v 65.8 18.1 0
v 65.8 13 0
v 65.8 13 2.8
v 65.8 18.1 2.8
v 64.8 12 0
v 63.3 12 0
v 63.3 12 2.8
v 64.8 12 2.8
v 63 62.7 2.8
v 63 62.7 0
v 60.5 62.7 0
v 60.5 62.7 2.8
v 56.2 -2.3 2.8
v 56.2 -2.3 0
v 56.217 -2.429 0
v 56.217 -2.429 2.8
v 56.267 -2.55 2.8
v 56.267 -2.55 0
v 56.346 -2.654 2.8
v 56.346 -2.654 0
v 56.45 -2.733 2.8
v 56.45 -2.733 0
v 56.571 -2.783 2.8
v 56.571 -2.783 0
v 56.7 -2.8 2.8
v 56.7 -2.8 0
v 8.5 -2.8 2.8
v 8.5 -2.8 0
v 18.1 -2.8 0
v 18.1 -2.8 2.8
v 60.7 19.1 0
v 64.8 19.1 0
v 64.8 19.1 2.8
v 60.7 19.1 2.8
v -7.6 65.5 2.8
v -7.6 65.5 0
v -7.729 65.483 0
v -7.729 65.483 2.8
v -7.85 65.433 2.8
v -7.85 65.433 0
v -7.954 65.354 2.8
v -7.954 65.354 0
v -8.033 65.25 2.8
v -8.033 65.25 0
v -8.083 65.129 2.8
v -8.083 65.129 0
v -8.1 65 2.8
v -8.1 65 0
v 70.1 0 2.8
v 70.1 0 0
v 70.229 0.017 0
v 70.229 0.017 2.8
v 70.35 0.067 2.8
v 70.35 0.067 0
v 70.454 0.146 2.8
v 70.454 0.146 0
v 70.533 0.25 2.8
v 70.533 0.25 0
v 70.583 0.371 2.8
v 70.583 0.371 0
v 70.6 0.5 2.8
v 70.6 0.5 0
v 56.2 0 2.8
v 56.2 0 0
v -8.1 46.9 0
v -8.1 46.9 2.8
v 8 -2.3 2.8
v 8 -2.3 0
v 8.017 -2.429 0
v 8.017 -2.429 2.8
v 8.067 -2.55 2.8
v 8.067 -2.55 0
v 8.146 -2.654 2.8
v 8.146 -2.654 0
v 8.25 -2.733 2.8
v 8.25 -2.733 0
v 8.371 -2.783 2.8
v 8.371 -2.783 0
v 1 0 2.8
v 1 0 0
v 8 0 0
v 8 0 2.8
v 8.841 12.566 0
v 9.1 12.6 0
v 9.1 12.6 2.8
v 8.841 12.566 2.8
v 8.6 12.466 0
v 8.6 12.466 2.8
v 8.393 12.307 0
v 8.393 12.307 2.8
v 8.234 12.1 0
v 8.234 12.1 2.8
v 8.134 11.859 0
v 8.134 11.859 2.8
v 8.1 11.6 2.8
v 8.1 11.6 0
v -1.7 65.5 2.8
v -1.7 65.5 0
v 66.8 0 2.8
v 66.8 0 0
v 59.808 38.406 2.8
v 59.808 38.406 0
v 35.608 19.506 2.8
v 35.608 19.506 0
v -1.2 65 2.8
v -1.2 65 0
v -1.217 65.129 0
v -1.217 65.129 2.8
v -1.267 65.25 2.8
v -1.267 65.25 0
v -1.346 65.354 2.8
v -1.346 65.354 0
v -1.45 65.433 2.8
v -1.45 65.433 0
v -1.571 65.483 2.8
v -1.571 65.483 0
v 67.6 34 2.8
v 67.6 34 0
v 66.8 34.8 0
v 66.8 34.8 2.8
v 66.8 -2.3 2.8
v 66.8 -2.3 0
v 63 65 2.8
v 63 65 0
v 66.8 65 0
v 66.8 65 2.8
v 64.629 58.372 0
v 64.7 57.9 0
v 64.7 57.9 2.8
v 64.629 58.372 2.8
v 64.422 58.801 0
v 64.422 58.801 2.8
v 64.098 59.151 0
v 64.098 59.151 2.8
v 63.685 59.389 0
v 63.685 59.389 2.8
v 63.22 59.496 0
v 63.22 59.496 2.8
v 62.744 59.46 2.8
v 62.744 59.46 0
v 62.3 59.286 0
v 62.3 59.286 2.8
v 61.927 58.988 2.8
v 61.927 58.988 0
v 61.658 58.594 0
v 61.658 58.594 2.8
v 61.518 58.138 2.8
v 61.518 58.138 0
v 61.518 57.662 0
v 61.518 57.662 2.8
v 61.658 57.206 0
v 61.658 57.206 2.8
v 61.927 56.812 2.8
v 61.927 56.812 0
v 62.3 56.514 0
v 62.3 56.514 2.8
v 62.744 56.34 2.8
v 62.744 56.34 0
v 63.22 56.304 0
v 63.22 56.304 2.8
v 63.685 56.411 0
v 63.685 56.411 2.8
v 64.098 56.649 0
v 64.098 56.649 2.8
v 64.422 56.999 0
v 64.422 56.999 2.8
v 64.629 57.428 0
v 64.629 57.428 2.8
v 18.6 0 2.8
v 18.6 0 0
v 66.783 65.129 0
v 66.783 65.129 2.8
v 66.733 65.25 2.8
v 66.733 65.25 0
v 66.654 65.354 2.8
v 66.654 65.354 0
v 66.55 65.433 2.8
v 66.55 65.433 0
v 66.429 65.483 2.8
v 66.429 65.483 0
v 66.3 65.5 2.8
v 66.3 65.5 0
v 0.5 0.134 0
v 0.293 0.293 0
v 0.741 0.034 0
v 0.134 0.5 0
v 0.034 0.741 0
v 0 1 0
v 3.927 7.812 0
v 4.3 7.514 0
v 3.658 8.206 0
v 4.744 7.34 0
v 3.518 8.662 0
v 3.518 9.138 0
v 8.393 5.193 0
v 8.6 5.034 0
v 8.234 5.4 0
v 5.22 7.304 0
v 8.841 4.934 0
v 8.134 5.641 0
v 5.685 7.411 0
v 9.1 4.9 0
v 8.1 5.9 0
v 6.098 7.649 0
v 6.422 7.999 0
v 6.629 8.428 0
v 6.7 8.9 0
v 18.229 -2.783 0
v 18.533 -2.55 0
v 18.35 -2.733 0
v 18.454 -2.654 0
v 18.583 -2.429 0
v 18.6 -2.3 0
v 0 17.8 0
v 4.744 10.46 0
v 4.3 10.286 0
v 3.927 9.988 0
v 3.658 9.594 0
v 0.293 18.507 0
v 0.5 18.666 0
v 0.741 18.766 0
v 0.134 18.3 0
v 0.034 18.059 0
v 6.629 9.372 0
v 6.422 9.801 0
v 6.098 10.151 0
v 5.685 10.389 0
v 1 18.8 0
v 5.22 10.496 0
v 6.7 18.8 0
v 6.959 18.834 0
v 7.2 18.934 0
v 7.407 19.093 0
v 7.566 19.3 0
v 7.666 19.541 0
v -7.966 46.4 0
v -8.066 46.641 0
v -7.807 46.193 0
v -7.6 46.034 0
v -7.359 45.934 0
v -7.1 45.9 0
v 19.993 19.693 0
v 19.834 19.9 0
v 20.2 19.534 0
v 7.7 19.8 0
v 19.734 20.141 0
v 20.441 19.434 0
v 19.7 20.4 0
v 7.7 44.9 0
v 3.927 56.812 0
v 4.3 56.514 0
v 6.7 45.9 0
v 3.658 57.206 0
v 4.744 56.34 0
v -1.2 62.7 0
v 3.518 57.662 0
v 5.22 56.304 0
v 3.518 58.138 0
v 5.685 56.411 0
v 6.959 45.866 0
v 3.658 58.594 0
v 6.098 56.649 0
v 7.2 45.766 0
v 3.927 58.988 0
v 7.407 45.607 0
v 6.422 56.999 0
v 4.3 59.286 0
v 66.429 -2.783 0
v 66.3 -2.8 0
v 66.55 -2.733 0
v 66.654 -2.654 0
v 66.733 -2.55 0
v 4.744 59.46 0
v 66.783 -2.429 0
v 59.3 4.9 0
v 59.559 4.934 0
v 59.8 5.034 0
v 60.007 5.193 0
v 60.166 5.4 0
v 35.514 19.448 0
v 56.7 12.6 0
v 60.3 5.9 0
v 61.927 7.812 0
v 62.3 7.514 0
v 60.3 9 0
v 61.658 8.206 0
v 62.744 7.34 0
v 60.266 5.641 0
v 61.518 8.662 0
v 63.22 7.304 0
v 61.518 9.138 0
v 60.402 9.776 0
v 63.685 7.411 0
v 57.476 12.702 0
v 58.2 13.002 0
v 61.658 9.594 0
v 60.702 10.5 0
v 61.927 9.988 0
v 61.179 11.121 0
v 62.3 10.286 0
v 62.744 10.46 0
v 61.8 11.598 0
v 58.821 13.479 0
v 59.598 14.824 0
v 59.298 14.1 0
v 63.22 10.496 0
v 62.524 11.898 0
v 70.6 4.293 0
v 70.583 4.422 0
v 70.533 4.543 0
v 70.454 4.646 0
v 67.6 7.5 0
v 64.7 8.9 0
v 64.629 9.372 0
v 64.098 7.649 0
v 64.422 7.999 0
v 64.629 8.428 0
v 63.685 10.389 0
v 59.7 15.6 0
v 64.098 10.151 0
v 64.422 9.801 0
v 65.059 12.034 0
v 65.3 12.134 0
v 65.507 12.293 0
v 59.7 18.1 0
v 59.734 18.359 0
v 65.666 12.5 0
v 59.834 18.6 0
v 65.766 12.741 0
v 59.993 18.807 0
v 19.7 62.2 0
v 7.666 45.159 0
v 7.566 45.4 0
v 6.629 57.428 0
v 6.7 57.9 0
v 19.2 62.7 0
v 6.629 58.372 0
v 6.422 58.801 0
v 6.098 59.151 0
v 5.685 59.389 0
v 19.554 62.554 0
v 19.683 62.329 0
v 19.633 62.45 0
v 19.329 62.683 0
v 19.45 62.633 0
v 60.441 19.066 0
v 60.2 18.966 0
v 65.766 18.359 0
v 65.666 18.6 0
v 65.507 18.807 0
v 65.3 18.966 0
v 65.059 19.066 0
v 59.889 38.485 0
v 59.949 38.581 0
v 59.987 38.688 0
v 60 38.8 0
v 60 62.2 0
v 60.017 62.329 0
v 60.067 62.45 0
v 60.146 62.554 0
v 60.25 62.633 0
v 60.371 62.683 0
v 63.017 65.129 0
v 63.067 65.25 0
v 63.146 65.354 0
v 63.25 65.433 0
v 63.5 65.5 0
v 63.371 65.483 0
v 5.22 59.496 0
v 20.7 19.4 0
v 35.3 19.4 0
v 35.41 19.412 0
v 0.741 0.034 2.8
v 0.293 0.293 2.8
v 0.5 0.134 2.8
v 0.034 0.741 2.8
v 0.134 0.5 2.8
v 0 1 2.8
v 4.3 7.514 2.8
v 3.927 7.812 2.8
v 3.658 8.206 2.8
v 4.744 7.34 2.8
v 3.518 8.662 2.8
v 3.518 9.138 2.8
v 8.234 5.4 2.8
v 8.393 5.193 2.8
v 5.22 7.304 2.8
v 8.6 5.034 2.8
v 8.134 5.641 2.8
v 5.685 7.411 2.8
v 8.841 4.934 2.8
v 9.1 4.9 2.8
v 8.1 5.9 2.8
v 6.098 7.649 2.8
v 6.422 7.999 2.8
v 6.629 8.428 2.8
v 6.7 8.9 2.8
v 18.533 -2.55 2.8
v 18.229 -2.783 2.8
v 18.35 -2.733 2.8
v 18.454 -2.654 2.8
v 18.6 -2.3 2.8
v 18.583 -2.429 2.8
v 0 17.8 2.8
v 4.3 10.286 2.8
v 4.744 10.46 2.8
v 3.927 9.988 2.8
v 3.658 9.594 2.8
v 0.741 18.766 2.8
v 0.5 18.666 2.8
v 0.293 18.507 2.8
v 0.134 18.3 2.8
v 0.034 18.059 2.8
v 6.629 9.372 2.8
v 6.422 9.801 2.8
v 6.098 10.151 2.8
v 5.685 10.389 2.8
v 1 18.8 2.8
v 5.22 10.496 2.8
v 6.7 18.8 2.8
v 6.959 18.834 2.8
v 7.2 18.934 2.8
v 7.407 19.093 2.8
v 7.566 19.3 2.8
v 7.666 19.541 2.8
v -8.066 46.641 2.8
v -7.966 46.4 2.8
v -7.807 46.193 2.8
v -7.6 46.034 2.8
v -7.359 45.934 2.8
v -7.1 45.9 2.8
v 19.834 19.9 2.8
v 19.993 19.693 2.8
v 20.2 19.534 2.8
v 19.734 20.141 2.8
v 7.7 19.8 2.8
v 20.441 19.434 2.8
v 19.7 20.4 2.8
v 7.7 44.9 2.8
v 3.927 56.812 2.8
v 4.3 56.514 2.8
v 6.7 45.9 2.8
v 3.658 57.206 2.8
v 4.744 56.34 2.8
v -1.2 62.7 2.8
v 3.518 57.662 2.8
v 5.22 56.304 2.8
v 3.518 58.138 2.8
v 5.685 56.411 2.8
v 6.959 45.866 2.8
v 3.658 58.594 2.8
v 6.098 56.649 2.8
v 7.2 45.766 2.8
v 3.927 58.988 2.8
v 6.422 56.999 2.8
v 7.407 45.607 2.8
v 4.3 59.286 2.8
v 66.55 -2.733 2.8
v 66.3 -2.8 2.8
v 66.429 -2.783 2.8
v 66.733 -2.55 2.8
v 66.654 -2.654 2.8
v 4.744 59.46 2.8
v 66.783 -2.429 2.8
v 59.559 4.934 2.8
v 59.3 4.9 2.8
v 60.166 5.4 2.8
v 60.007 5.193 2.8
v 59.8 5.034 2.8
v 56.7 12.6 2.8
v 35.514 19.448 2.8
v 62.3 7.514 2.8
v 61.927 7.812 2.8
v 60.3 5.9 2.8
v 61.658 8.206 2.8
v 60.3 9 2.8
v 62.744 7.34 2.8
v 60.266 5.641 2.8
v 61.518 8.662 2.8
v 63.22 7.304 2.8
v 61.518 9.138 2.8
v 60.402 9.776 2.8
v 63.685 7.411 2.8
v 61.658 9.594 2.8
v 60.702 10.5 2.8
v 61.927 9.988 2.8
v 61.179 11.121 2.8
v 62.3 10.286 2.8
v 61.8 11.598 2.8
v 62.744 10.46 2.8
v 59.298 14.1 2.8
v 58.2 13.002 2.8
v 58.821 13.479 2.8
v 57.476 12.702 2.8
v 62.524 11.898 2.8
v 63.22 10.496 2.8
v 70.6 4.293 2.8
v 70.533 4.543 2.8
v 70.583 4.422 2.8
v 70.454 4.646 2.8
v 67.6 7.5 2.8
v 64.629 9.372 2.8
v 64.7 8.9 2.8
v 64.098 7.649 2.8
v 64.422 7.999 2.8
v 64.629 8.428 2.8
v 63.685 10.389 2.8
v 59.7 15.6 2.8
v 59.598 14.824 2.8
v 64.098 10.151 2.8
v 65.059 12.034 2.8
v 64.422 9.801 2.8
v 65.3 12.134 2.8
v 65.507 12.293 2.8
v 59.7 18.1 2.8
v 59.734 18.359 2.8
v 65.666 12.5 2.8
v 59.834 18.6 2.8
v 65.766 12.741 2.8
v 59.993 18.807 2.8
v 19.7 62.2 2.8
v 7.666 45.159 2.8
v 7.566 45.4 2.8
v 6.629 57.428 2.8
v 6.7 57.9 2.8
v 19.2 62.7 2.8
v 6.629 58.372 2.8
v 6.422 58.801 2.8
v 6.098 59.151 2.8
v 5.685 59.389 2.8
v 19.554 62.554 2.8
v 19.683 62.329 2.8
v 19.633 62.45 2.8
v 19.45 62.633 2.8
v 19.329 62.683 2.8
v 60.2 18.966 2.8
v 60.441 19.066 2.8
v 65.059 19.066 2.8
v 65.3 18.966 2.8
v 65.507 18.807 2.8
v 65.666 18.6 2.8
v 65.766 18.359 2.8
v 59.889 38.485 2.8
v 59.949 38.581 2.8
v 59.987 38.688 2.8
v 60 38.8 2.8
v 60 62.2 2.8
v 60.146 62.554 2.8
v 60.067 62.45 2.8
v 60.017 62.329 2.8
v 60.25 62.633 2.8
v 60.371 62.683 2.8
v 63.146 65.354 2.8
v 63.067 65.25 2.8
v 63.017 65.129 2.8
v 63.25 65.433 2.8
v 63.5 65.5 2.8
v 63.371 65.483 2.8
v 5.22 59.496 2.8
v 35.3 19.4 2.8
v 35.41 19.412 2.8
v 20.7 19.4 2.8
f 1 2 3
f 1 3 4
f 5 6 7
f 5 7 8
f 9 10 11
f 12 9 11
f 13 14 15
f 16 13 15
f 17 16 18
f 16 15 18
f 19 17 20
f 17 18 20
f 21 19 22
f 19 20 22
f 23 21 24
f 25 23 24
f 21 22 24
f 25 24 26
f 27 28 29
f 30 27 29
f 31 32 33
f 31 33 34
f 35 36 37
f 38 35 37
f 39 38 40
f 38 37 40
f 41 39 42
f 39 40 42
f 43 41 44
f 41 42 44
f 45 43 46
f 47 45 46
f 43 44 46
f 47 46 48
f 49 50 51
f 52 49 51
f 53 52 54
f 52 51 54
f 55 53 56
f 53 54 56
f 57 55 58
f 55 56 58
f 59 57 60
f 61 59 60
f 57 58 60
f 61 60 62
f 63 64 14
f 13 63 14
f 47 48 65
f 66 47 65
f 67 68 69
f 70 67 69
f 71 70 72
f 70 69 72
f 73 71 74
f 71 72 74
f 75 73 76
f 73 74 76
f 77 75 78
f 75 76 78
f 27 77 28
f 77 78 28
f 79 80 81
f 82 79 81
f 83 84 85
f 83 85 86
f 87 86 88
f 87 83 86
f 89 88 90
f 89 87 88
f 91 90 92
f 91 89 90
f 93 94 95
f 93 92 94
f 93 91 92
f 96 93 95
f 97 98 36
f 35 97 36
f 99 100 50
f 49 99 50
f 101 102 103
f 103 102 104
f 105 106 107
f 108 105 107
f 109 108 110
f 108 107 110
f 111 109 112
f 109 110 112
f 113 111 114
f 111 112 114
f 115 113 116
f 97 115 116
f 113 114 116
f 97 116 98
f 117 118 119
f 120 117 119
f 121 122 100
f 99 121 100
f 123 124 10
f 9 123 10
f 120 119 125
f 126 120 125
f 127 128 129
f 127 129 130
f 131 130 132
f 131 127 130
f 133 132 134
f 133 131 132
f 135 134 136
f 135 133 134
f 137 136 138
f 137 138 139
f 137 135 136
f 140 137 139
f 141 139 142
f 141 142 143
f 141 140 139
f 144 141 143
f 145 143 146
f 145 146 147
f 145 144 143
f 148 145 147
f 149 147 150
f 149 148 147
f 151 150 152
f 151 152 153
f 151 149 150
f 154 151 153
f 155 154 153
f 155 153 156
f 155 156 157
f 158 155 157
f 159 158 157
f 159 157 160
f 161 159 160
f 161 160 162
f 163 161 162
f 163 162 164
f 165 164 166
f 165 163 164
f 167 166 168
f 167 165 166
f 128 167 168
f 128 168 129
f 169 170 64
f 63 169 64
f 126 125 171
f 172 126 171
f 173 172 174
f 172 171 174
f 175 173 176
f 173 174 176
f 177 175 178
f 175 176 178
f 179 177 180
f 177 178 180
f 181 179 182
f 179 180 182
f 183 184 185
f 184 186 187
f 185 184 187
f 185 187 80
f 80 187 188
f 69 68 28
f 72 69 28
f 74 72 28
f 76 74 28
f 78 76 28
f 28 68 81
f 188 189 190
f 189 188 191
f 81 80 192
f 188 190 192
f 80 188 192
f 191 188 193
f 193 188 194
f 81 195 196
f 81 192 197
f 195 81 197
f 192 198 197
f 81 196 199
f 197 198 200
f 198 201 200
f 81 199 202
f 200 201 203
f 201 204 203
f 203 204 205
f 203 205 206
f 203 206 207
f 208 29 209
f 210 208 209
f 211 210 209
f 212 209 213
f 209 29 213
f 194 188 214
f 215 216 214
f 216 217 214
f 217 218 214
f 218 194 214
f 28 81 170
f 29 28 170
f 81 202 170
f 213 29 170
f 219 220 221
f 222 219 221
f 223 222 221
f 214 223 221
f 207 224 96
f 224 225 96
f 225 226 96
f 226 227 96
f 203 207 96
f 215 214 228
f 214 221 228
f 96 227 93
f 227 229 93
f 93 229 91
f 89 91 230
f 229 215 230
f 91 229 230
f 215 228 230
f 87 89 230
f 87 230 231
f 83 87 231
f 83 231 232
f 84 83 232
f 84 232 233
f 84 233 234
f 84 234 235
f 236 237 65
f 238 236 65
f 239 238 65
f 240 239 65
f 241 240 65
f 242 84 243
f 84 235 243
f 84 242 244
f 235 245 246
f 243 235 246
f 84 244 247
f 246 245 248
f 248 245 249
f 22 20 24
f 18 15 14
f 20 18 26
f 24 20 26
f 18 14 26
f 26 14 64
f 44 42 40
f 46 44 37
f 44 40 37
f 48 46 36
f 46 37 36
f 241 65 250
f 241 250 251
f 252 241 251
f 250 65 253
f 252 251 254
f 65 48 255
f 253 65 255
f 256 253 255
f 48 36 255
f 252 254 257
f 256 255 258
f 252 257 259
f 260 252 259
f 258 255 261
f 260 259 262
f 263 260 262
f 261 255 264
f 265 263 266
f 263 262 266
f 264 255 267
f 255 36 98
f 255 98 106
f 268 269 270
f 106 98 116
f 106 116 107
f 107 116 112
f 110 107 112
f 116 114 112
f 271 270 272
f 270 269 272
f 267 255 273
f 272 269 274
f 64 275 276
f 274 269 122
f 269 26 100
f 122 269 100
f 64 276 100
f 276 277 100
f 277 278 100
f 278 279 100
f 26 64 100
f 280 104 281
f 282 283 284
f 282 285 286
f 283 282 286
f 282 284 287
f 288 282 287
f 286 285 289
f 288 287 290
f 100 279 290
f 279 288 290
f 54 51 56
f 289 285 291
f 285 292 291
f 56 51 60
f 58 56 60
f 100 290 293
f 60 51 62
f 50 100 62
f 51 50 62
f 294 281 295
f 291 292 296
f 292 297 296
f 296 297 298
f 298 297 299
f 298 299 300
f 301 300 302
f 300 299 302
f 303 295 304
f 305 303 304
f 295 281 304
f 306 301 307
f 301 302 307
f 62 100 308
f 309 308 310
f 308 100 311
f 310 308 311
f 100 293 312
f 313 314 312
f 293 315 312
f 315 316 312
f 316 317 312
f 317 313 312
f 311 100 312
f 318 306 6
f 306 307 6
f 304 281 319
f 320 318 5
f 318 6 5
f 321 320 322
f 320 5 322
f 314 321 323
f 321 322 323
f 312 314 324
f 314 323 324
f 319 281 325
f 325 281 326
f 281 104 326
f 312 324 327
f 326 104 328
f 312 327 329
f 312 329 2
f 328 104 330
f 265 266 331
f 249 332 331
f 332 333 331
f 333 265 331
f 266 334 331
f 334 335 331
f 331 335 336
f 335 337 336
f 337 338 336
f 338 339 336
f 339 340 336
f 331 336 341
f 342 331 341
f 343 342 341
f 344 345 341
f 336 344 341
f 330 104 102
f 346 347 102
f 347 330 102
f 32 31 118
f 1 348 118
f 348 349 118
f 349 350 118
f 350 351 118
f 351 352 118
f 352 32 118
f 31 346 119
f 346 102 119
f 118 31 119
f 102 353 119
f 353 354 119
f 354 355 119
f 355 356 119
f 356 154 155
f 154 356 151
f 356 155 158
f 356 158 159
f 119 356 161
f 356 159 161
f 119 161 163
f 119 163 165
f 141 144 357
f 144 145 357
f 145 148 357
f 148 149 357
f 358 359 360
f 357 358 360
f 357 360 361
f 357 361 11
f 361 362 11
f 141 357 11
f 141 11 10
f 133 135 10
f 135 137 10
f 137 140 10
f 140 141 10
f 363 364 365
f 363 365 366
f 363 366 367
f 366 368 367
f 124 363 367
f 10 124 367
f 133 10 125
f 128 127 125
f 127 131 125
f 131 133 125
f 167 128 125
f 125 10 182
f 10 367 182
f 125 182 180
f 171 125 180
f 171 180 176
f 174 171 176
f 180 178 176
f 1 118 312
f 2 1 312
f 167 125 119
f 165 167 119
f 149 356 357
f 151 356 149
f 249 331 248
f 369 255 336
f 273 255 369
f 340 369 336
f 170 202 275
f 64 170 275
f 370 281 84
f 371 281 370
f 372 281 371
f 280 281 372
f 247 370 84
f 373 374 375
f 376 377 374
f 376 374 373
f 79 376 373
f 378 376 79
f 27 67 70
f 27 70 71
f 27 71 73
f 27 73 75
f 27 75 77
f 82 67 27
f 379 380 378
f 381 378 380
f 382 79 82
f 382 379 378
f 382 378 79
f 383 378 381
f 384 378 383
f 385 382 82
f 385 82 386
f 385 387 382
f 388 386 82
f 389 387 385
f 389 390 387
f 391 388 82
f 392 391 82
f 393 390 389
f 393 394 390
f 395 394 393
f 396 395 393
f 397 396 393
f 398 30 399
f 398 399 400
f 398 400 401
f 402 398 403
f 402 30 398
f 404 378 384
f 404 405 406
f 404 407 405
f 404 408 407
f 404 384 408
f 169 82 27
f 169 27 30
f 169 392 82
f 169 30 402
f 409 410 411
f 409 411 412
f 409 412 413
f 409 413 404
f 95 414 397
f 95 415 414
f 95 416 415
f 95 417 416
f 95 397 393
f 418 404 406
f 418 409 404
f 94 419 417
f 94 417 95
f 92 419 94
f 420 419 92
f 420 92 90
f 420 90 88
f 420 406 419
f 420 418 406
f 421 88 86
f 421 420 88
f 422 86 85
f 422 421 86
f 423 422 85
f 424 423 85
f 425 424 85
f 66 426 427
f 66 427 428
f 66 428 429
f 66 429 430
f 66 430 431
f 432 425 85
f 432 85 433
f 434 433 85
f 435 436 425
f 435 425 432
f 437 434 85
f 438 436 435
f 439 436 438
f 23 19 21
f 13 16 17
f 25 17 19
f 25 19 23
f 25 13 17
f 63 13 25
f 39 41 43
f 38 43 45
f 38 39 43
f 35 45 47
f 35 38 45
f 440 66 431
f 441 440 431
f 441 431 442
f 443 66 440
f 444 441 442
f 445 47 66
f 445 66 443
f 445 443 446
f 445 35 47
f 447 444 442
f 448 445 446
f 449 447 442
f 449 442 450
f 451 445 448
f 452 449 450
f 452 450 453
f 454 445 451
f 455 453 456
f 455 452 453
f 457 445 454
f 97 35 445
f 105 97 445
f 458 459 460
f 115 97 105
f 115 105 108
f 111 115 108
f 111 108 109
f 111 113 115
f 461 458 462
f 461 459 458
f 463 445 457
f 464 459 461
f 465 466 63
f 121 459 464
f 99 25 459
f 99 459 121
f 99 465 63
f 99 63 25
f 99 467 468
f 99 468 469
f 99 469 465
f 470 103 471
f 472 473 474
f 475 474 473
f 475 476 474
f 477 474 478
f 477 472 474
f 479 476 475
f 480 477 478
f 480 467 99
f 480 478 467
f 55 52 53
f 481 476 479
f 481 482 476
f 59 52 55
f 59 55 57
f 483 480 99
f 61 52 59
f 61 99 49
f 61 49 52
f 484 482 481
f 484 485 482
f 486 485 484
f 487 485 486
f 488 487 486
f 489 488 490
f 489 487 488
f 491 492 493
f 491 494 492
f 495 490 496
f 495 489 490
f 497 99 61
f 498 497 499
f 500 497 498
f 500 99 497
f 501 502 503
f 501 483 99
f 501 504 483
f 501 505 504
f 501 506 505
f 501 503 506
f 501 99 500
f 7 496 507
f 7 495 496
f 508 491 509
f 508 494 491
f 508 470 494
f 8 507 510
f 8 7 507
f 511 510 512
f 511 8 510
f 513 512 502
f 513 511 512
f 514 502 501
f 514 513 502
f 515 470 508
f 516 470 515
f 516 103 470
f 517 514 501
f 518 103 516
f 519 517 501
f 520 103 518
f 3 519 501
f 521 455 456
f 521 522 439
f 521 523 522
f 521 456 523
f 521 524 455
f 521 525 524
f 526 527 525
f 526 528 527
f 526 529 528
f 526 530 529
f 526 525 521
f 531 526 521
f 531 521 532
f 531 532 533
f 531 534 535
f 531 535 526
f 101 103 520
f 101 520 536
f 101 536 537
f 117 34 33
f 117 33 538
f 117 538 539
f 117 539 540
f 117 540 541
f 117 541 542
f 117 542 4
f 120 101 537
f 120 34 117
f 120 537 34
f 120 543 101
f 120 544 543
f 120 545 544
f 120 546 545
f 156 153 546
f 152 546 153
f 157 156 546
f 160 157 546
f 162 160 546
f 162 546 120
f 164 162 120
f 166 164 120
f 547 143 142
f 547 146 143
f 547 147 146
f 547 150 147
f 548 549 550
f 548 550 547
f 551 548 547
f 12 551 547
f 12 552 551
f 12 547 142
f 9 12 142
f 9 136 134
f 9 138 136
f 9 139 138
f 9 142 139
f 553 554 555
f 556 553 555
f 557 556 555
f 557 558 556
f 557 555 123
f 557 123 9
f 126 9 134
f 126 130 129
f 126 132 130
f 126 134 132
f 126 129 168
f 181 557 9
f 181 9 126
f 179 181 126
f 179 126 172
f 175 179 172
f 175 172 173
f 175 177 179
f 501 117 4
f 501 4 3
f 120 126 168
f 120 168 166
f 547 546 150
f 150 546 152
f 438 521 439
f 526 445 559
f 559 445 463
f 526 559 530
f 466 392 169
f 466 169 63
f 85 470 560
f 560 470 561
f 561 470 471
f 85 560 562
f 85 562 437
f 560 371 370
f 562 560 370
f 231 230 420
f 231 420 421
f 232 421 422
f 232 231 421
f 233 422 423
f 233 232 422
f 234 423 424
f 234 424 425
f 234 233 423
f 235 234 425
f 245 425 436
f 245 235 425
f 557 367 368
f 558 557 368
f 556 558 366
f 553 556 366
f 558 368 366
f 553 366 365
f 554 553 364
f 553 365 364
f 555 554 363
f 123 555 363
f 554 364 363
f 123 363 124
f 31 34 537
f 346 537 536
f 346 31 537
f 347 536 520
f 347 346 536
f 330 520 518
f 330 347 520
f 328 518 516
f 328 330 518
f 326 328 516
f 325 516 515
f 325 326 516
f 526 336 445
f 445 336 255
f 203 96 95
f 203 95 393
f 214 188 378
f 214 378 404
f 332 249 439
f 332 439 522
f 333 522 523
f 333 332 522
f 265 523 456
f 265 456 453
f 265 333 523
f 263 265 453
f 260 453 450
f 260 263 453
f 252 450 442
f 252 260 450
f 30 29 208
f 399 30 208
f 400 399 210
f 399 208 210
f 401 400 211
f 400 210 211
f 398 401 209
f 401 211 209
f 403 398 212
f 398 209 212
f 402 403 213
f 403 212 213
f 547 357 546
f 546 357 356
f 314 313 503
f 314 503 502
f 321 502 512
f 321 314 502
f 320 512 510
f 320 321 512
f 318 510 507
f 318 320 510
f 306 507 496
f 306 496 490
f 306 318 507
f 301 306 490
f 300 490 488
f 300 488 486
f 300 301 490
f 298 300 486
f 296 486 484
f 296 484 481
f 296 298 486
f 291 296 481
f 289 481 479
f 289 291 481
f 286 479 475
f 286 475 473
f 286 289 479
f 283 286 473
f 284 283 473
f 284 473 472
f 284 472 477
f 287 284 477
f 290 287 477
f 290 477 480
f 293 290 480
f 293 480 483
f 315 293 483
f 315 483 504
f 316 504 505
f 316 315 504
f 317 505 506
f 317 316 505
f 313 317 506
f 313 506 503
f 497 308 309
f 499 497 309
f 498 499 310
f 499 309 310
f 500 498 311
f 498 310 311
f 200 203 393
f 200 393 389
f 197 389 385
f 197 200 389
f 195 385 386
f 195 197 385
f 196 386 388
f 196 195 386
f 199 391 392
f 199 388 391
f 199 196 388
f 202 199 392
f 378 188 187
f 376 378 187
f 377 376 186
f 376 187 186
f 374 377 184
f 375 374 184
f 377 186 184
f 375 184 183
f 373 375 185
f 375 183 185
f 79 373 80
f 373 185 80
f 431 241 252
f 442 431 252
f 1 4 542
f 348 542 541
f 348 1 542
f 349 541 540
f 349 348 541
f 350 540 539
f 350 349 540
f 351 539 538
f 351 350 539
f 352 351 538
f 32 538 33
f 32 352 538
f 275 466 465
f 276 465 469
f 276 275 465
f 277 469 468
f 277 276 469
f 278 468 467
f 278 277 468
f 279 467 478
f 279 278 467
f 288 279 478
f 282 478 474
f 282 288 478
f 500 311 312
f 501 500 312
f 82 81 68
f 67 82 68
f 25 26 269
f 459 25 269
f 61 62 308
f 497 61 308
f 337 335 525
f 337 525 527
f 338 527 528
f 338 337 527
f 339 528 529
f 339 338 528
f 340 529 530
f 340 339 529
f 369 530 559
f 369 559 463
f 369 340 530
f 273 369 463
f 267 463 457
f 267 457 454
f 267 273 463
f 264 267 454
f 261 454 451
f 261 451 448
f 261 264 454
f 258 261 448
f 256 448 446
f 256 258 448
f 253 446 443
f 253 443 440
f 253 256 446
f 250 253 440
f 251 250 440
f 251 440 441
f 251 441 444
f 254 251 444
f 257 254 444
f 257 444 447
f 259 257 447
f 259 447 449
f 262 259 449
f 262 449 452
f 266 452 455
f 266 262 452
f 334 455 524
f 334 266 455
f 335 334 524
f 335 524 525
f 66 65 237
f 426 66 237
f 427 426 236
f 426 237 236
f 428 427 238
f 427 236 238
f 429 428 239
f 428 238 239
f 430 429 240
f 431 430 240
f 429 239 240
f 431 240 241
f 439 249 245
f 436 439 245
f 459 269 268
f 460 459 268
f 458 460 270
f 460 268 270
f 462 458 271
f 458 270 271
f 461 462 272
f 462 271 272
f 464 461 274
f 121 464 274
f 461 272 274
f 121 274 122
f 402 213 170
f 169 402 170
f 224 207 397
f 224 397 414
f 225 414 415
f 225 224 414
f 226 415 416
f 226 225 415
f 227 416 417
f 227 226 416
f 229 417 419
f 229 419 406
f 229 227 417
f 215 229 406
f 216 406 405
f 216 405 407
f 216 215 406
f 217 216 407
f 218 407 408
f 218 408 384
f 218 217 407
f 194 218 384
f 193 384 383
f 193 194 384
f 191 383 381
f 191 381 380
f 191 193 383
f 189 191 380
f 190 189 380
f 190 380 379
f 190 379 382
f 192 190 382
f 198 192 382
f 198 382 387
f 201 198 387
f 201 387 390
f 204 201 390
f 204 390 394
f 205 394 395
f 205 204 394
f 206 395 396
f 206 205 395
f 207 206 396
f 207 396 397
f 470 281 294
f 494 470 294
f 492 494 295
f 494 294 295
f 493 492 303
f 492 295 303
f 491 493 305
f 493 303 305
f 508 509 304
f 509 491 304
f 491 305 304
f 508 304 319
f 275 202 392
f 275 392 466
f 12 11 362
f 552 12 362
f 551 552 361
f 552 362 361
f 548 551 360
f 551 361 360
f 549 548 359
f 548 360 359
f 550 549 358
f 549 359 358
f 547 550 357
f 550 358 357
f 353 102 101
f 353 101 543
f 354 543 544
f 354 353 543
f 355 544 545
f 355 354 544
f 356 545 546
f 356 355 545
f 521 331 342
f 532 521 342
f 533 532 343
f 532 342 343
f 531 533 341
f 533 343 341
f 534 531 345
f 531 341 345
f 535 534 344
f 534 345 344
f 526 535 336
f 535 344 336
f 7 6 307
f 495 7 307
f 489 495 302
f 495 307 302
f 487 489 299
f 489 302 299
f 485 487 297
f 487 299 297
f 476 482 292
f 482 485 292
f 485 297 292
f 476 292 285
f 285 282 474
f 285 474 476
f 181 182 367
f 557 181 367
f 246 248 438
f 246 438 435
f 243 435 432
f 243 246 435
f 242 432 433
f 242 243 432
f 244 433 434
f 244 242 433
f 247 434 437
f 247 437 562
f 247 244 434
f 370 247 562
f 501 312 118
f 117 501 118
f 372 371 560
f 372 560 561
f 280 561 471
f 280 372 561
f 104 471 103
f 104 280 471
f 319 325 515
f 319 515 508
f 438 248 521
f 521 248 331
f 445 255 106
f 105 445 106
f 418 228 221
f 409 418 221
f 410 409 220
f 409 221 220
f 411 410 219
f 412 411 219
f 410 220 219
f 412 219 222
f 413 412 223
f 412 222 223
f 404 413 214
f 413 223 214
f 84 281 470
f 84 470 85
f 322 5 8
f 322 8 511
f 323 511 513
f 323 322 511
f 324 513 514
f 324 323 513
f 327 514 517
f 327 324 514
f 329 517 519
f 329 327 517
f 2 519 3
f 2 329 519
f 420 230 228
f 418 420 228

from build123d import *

# Parameters (mm, degrees)
SKETCH_R     = 1.6
PAD_DEPTH    = 2.8
POCKET_DEPTH = 2.801


with BuildPart() as part:
    # Sketch → Pad (new body)
    with BuildSketch(Plane.XY):
        with BuildLine():
            Line((1, 0), (8, 0))
            Line((8, 0), (8, -2.3))
            ThreePointArc((8, -2.3), (8.146447, -2.653553), (8.5, -2.8))
            Line((8.5, -2.8), (18.1, -2.8))
            ThreePointArc((18.1, -2.8), (18.453553, -2.653553), (18.6, -2.3))
            Line((18.6, -2.3), (18.6, 0))
            Line((18.6, 0), (56.2, 0))
            Line((56.2, 0), (56.2, -2.3))
            ThreePointArc((56.2, -2.3), (56.346447, -2.653553), (56.7, -2.8))
            Line((56.7, -2.8), (66.3, -2.8))
            ThreePointArc((66.3, -2.8), (66.653553, -2.653553), (66.8, -2.3))
            Line((66.8, -2.3), (66.8, 0))
            Line((66.8, 0), (70.1, 0))
            ThreePointArc((70.1, 0), (70.453553, 0.146447), (70.6, 0.5))
            Line((70.6, 0.5), (70.6, 4.292893))
            ThreePointArc((70.6, 4.292893), (70.56194, 4.484235), (70.453553, 4.646447))
            Line((70.453553, 4.646447), (67.6, 7.5))
            Line((67.6, 7.5), (67.6, 34))
            Line((67.6, 34), (66.8, 34.8))
            Line((66.8, 34.8), (66.8, 65))
            ThreePointArc((66.8, 65), (66.653553, 65.353553), (66.3, 65.5))
            Line((66.3, 65.5), (63.5, 65.5))
            ThreePointArc((63.5, 65.5), (63.146447, 65.353553), (63, 65))
            Line((63, 65), (63, 62.7))
            Line((63, 62.7), (60.5, 62.7))
            ThreePointArc((60.5, 62.7), (60.146447, 62.553553), (60, 62.2))
            Line((60, 62.2), (60, 38.8))
            ThreePointArc((59.807759, 38.405938), (59.949377, 38.580773), (60, 38.8))
            Line((59.807759, 38.405938), (35.607759, 19.505938))
            ThreePointArc((35.3, 19.4), (35.462741, 19.427226), (35.607759, 19.505938))
            Line((35.3, 19.4), (20.7, 19.4))
            ThreePointArc((19.7, 20.4), (19.992893, 19.692893), (20.7, 19.4))
            Line((19.7, 20.4), (19.7, 62.2))
            ThreePointArc((19.7, 62.2), (19.553553, 62.553553), (19.2, 62.7))
            Line((19.2, 62.7), (-1.2, 62.7))
            Line((-1.2, 62.7), (-1.2, 65))
            ThreePointArc((-1.2, 65), (-1.346447, 65.353553), (-1.7, 65.5))
            Line((-1.7, 65.5), (-7.6, 65.5))
            ThreePointArc((-7.6, 65.5), (-7.953553, 65.353553), (-8.1, 65))
            Line((-8.1, 65), (-8.1, 46.9))
            ThreePointArc((-8.1, 46.9), (-7.807107, 46.192893), (-7.1, 45.9))
            Line((-7.1, 45.9), (6.7, 45.9))
            ThreePointArc((7.7, 44.9), (7.407107, 45.607107), (6.7, 45.9))
            Line((7.7, 44.9), (7.7, 19.8))
            ThreePointArc((6.7, 18.8), (7.407107, 19.092893), (7.7, 19.8))
            Line((6.7, 18.8), (1, 18.8))
            ThreePointArc((1, 18.8), (0.292893, 18.507107), (0, 17.8))
            Line((0, 1), (0, 17.8))
            ThreePointArc((0, 1), (0.292893, 0.292893), (1, 0))
        make_face()
        with Locations((5.1, 57.9)):
            Circle(SKETCH_R, mode=Mode.SUBTRACT)
        with Locations((63.1, 57.9)):
            Circle(SKETCH_R, mode=Mode.SUBTRACT)
        with Locations((5.1, 8.9)):
            Circle(SKETCH_R, mode=Mode.SUBTRACT)
        with Locations((63.1, 8.9)):
            Circle(SKETCH_R, mode=Mode.SUBTRACT)
    extrude(amount=PAD_DEPTH)

    # Sketch001 → Pocket (cut, through all)
    with BuildSketch(Plane.XY):
        with BuildLine():
            Line((64.8, 19.1), (60.7, 19.1))
            ThreePointArc((60.7, 19.1), (59.992893, 18.807107), (59.7, 18.1))
            Line((59.7, 18.1), (59.7, 15.6))
            ThreePointArc((56.7, 12.6), (58.82132, 13.47868), (59.7, 15.6))
            Line((56.7, 12.6), (9.1, 12.6))
            ThreePointArc((9.1, 12.6), (8.392893, 12.307107), (8.1, 11.6))
            Line((8.1, 11.6), (8.1, 5.9))
            ThreePointArc((8.1, 5.9), (8.392893, 5.192893), (9.1, 4.9))
            Line((9.1, 4.9), (59.3, 4.9))
            ThreePointArc((59.3, 4.9), (60.007107, 5.192893), (60.3, 5.9))
            Line((60.3, 5.9), (60.3, 9))
            ThreePointArc((63.3, 12), (61.17868, 11.12132), (60.3, 9))
            Line((63.3, 12), (64.8, 12))
            ThreePointArc((64.8, 12), (65.507107, 12.292893), (65.8, 13))
            Line((65.8, 13), (65.8, 18.1))
            ThreePointArc((65.8, 18.1), (65.507107, 18.807107), (64.8, 19.1))
        make_face()
    extrude(amount=POCKET_DEPTH, mode=Mode.SUBTRACT)


solid = part.part
